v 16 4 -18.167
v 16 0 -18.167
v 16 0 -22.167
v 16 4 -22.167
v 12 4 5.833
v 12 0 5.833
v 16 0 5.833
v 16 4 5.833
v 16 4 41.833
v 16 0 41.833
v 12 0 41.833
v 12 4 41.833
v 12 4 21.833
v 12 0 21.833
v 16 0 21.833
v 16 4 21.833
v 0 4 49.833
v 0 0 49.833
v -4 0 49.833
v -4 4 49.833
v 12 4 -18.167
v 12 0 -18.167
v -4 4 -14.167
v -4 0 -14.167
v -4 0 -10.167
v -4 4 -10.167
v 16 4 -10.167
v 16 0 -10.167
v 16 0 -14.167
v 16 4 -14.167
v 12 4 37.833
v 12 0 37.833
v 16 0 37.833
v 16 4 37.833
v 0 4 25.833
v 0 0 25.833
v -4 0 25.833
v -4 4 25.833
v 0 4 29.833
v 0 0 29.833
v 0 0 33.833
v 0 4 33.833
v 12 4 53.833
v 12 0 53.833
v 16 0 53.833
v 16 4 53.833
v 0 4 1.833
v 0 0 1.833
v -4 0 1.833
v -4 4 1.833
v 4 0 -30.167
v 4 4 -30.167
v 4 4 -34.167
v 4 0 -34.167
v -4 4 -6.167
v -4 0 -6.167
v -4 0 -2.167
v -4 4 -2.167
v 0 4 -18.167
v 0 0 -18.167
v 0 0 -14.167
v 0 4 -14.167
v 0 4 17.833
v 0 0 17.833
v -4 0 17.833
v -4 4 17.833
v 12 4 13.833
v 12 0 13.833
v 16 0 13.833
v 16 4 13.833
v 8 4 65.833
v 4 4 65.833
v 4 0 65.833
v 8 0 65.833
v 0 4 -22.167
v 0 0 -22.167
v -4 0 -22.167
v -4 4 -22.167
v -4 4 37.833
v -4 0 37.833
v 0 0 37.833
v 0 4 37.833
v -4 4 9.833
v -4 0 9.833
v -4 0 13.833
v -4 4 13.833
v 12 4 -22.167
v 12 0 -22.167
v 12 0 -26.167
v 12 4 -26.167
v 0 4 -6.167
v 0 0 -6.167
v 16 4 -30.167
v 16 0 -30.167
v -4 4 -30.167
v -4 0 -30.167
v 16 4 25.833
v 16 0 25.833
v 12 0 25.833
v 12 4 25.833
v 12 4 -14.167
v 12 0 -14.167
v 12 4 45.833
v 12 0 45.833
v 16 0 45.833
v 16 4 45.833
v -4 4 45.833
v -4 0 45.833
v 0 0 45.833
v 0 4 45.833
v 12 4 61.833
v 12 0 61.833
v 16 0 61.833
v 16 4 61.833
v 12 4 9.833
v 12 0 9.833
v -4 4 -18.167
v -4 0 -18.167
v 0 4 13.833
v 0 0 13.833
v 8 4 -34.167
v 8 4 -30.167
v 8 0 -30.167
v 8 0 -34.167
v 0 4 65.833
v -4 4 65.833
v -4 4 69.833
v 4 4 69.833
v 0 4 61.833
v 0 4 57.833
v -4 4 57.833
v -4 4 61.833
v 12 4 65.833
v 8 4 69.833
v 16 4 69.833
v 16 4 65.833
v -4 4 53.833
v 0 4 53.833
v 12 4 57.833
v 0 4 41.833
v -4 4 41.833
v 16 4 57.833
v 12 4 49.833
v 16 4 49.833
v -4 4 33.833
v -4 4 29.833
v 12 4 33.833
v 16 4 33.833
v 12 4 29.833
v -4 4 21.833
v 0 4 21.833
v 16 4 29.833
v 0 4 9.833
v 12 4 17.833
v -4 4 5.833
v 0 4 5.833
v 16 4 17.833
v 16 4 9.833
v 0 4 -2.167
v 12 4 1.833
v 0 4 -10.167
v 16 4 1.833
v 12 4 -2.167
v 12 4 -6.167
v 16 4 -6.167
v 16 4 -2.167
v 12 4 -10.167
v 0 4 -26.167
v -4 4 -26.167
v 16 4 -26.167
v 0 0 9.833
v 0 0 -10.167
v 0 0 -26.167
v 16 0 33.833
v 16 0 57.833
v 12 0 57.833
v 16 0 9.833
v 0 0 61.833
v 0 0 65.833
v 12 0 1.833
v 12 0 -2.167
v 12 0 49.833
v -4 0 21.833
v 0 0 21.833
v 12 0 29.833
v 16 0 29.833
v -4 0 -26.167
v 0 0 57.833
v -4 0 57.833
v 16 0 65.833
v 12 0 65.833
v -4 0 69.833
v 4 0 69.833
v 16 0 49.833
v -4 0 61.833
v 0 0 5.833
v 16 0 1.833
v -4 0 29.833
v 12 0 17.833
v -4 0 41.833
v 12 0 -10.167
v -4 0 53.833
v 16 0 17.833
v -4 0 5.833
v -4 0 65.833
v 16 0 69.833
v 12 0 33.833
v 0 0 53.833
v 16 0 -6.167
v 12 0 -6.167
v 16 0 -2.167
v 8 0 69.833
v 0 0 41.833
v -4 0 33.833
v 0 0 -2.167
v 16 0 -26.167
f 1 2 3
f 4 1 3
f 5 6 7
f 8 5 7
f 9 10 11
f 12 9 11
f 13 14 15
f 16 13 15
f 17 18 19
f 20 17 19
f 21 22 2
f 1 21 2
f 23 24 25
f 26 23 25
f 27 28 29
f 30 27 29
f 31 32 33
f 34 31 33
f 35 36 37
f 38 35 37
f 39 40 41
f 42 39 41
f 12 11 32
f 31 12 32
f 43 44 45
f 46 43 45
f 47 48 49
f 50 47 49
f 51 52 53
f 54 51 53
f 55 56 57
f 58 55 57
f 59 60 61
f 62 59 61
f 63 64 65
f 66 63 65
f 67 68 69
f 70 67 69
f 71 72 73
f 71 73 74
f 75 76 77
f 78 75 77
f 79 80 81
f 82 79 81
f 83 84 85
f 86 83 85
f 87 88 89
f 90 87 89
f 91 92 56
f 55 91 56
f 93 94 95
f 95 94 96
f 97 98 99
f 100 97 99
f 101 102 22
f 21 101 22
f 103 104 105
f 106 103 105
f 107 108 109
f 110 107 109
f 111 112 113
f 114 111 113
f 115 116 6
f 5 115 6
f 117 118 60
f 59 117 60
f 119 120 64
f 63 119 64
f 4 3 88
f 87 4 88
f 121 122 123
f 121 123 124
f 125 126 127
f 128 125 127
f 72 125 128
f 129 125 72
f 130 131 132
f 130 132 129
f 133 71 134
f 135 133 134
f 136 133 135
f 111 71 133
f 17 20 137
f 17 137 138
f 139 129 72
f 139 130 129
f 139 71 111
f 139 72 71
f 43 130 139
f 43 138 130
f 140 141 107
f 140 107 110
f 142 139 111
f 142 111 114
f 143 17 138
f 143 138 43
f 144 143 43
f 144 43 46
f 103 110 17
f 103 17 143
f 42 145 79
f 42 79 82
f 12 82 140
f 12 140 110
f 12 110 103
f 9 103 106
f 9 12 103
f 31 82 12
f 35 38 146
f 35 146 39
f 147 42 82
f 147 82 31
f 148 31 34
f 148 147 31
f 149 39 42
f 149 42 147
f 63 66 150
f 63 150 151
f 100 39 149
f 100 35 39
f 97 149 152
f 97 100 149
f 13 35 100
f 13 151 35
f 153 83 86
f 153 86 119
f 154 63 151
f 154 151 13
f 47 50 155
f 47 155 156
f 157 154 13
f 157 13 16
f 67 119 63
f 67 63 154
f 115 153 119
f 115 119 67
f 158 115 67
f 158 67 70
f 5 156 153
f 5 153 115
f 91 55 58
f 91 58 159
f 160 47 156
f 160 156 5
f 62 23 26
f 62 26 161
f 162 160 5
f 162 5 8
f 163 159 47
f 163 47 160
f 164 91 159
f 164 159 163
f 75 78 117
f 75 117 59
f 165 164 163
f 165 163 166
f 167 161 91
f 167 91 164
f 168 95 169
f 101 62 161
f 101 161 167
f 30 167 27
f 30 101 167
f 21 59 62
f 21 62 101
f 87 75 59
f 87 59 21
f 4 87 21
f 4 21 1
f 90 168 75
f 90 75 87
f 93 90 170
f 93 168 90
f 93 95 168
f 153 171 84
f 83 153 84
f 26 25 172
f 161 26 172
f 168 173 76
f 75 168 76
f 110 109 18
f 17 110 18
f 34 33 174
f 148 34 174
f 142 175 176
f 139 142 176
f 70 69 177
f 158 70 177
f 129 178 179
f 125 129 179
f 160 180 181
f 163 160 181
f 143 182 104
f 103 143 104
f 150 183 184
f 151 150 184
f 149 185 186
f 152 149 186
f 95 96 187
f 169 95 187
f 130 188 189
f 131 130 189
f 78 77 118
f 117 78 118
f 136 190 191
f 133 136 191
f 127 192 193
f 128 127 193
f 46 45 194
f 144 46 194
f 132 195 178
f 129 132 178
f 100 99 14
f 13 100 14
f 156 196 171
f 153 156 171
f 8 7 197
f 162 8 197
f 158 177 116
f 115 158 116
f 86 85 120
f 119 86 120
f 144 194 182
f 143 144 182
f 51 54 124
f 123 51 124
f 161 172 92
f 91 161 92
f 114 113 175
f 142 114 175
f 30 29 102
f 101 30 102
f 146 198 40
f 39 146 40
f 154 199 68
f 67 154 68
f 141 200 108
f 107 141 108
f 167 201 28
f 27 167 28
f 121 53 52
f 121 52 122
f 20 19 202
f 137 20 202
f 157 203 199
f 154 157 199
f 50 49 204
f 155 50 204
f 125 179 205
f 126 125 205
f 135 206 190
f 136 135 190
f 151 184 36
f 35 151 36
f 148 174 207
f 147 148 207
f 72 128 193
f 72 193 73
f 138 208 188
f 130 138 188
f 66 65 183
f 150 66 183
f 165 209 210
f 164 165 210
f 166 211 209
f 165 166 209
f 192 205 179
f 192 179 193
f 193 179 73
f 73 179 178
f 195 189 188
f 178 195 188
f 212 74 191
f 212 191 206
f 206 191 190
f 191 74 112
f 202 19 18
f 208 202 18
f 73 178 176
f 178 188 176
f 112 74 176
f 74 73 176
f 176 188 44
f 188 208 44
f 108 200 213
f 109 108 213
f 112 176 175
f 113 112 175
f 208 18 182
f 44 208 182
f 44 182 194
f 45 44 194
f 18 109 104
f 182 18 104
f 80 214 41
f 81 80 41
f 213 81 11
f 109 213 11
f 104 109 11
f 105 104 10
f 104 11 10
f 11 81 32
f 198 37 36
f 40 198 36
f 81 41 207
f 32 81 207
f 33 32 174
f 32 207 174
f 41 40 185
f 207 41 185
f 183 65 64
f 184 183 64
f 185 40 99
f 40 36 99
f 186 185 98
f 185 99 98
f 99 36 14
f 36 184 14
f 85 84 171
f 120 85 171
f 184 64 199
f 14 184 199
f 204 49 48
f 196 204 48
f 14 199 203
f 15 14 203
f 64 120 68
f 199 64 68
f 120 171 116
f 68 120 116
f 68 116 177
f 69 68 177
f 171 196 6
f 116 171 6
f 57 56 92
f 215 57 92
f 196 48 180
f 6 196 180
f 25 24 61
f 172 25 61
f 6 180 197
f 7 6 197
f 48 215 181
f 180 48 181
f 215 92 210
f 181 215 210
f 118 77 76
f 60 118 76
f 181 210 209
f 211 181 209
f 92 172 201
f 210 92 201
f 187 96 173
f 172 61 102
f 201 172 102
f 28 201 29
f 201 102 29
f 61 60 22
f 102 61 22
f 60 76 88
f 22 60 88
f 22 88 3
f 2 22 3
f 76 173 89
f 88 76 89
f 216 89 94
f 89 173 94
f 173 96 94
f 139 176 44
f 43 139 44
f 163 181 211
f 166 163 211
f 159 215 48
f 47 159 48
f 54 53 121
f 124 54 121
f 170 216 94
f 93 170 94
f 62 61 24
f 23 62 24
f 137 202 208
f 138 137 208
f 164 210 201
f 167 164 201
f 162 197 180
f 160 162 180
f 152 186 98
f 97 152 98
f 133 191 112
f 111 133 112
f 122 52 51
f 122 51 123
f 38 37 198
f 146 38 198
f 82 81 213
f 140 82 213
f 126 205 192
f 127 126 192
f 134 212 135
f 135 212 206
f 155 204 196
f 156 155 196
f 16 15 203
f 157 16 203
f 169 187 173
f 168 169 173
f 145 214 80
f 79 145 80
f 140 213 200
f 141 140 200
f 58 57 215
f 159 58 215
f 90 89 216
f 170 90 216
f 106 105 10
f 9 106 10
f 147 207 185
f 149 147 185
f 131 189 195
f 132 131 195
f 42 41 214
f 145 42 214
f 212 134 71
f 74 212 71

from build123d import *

# Parameters (mm, degrees)
BOSS_EXTRUDE1_DEPTH = 4
SKETCH2_W           = 4
SKETCH2_H           = 4
BOSS_EXTRUDE2_DEPTH = 4
SKETCH3_W           = 4
SKETCH3_H           = 4
CUT_EXTRUDE1_DEPTH  = 10


with BuildPart() as part:
    # Sketch1 → Boss-Extrude1 (new body)
    with BuildSketch(Plane(origin=(0, 0, 0), x_dir=(1, 0, 0), z_dir=(0, 1, 0))):
        Polygon((0, 30.166666667), (-4, 30.166666667), (-4, 26.166666667), (0, 26.166666667), (0, 22.166666667), (-4, 22.166666667), (-4, 18.166666667), (0, 18.166666667), (0, 14.166666667), (-4, 14.166666667), (-4, 10.166666667), (0, 10.166666667), (0, 6.166666667), (-4, 6.166666667), (-4, 2.166666667), (0, 2.166666667), (0, -1.833333333), (-4, -1.833333333), (-4, -5.833333333), (0, -5.833333333), (0, -9.833333333), (-4, -9.833333333), (-4, -13.833333333), (0, -13.833333333), (0, -17.833333333), (-4, -17.833333333), (-4, -21.833333333), (0, -21.833333333), (0, -25.833333333), (-4, -25.833333333), (-4, -29.833333333), (0, -29.833333333), (0, -33.833333333), (-4, -33.833333333), (-4, -37.833333333), (0, -37.833333333), (0, -41.833333333), (-4, -41.833333333), (-4, -45.833333333), (0, -45.833333333), (0, -49.833333333), (-4, -49.833333333), (-4, -53.833333333), (0, -53.833333333), (0, -57.833333333), (-4, -57.833333333), (-4, -61.833333333), (0, -61.833333333), (0, -65.833333333), (-4, -65.833333333), (-4, -69.833333333), (16, -69.833333333), (16, -65.833333333), (12, -65.833333333), (12, -61.833333333), (16, -61.833333333), (16, -57.833333333), (12, -57.833333333), (12, -53.833333333), (16, -53.833333333), (16, -49.833333333), (12, -49.833333333), (12, -45.833333333), (16, -45.833333333), (16, -41.833333333), (12, -41.833333333), (12, -37.833333333), (16, -37.833333333), (16, -33.833333333), (12, -33.833333333), (12, -29.833333333), (16, -29.833333333), (16, -25.833333333), (12, -25.833333333), (12, -21.833333333), (16, -21.833333333), (16, -17.833333333), (12, -17.833333333), (12, -13.833333333), (16, -13.833333333), (16, -9.833333333), (12, -9.833333333), (12, -5.833333333), (16, -5.833333333), (16, -1.833333333), (12, -1.833333333), (12, 2.166666667), (16, 2.166666667), (16, 6.166666667), (12, 6.166666667), (12, 10.166666667), (16, 10.166666667), (16, 14.166666667), (12, 14.166666667), (12, 18.166666667), (16, 18.166666667), (16, 22.166666667), (12, 22.166666667), (12, 26.166666667), (16, 26.166666667), (16, 30.166666667), (12, 30.166666667), align=None)
    extrude(amount=BOSS_EXTRUDE1_DEPTH)

    # Sketch3 → Cut-Extrude1 (cut)
    with BuildSketch(Plane(origin=(0, 4, 0), x_dir=(1, 0, 0), z_dir=(0, 1, 0))):
        with Locations((6, -67.833333333)):
            Rectangle(SKETCH3_W, SKETCH3_H)
    extrude(amount=-CUT_EXTRUDE1_DEPTH, mode=Mode.SUBTRACT)


with BuildPart() as body_2:
    # Sketch2 → Boss-Extrude2 (new body)
    with BuildSketch(Plane(origin=(0, 4, 0), x_dir=(1, 0, 0), z_dir=(0, 1, 0))):
        with Locations((6, 32.166666667)):
            Rectangle(SKETCH2_W, SKETCH2_H)
    extrude(amount=-BOSS_EXTRUDE2_DEPTH)


solid = Compound([part.part, body_2.part])
